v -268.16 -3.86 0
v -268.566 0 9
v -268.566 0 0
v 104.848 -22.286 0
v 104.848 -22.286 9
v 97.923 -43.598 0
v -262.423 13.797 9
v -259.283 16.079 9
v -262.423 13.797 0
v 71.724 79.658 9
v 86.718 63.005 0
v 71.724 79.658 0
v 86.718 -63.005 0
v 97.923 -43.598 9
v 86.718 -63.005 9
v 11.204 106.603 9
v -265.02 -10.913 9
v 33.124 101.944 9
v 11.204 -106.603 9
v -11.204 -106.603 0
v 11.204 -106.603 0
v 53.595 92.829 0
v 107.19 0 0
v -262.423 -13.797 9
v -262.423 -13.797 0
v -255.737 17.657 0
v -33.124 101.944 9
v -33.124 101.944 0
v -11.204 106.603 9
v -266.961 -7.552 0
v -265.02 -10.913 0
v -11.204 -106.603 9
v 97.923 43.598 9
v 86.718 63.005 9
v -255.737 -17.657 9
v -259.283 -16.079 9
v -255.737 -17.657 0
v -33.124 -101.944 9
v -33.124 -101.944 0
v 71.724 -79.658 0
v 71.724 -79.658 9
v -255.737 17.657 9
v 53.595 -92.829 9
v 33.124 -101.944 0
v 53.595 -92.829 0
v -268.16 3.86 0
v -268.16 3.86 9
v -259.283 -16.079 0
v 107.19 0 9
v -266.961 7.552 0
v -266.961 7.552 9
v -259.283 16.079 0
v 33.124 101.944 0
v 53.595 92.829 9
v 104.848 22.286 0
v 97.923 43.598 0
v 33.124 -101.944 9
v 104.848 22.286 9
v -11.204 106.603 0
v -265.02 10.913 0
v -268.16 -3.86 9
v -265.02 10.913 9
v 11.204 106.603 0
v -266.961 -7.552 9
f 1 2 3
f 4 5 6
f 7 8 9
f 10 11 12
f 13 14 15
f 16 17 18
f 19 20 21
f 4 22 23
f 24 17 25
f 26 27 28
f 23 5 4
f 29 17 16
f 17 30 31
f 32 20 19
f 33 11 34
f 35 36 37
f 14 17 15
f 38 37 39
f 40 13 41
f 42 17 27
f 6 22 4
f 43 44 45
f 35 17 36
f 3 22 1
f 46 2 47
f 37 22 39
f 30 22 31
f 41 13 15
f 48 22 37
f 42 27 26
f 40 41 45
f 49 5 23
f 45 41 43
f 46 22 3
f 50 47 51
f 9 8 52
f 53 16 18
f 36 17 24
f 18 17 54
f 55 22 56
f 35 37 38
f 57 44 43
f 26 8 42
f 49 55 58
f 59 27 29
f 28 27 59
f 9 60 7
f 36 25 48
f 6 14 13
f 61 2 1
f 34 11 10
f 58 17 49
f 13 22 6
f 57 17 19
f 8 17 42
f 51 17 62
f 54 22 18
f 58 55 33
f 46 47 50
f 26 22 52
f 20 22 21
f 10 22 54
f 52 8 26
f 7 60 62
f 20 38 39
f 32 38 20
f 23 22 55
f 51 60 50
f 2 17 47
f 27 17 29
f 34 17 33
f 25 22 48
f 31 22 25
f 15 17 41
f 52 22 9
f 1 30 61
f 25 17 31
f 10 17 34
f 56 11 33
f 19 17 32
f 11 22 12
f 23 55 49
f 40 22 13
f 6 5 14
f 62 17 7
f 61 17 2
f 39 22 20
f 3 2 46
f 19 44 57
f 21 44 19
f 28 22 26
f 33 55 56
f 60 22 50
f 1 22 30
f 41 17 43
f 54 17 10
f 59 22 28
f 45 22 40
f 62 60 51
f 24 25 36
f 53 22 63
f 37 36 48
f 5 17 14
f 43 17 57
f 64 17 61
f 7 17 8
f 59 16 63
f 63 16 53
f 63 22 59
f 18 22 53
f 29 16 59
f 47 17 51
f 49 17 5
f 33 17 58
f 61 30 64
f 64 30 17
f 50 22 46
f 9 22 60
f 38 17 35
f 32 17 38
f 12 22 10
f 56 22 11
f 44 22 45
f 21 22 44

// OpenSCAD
inch = 25.4;
pitch = .5 * inch;

function pitch_radius(P, N) = P / (2 *sin(180/N));
N = 53;
n = 9;
w = 9;
D = pitch_radius(pitch, N)*2;
d = pitch_radius(pitch, n)*2;
separation = 250;
rotate([0, 0, 180])
hull(){
  cylinder(d=D, h=w);
  translate([separation, 0, 0])cylinder(d=d, h=w);
}
